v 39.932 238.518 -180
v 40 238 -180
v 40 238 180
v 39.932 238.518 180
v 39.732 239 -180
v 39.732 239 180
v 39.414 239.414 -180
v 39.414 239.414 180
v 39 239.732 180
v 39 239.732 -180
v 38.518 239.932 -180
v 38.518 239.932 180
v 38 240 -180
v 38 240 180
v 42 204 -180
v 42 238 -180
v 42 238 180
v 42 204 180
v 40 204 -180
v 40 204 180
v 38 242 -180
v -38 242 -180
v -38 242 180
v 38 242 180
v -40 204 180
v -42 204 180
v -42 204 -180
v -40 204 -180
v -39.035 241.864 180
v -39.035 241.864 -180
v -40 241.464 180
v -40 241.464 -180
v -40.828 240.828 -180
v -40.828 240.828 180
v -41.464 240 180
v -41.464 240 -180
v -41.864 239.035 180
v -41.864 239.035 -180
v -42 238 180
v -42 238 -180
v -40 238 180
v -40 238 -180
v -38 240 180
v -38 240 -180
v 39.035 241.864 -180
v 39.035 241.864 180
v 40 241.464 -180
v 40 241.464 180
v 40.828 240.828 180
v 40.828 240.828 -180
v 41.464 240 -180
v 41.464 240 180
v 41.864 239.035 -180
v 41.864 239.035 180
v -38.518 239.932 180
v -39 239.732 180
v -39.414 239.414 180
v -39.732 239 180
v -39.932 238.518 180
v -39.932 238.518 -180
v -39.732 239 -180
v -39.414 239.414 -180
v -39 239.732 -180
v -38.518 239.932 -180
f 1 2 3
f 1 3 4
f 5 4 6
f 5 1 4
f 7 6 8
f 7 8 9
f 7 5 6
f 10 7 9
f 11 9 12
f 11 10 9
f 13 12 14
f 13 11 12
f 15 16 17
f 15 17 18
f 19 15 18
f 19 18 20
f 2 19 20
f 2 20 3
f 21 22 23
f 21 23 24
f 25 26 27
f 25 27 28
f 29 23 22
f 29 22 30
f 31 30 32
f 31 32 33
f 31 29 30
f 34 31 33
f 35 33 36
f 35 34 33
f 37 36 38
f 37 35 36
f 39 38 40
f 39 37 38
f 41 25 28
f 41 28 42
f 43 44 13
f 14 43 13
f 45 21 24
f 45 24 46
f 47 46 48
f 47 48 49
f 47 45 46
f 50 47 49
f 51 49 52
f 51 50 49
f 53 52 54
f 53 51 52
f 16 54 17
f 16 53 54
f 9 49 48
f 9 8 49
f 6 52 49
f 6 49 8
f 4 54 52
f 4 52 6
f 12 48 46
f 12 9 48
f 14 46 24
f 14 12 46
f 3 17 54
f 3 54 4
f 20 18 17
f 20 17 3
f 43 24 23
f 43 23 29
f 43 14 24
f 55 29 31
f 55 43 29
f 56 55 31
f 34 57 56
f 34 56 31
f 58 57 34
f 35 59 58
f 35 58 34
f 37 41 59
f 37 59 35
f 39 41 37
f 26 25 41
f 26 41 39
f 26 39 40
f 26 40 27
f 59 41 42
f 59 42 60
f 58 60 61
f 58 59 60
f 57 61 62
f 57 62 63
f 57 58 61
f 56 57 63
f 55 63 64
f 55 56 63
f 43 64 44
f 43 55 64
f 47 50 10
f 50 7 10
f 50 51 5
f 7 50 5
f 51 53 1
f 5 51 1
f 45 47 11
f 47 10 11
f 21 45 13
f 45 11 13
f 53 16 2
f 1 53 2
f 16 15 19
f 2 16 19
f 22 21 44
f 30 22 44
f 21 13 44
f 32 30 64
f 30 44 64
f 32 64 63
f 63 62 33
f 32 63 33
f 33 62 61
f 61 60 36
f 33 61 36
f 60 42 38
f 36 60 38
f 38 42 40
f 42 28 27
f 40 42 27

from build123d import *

# Parameters (mm, degrees)
SKETCH1_W                      = 80
SKETCH1_H                      = 360
BASE_FLANGE1_DEPTH             = 2
EDGE_FLANGE1_STRIP_W           = 12
EDGE_FLANGE1_STRIP_H           = 2
EDGE_FLANGE1_STRIP_CUT_DEPTH   = 360
EDGE_FLANGE1_STRIP_2_W         = 12
EDGE_FLANGE1_STRIP_2_H         = 2
EDGE_FLANGE1_STRIP_CUT_2_DEPTH = 360
EDGE_FLANGE1_DEPTH             = 360
EDGE_FLANGE1_BEND_DEPTH        = 360


# Sheet-metal steps are written as plain solids
with BuildPart() as part:
    # Sketch1 → Base-Flange1 (new body)
    with BuildSketch(Plane(origin=(0, 240, 0), x_dir=(1, 0, 0), z_dir=(0, 1, 0))):
        Rectangle(SKETCH1_W, SKETCH1_H)
    extrude(amount=BASE_FLANGE1_DEPTH)

    # Edge-Flange1 strip (across the edge) → Edge-Flange1 strip cut (cut)
    with BuildSketch(Plane(origin=(40, 240, -180), x_dir=(-1, 0, 0), z_dir=(0, 0, 1))):
        with Locations((-4, -1)):
            Rectangle(EDGE_FLANGE1_STRIP_W, EDGE_FLANGE1_STRIP_H)
    extrude(amount=EDGE_FLANGE1_STRIP_CUT_DEPTH, mode=Mode.SUBTRACT)

    # Edge-Flange1 strip 2 (across the edge) → Edge-Flange1 strip cut 2 (cut)
    with BuildSketch(Plane(origin=(-40, 240, 180), x_dir=(1, 0, 0), z_dir=(0, 0, -1))):
        with Locations((-4, -1)):
            Rectangle(EDGE_FLANGE1_STRIP_2_W, EDGE_FLANGE1_STRIP_2_H)
    extrude(amount=EDGE_FLANGE1_STRIP_CUT_2_DEPTH, mode=Mode.SUBTRACT)

    # Edge-Flange1 section (across the edge) → Edge-Flange1 (add)
    with BuildSketch(Plane(origin=(40, 240, -180), x_dir=(-1, 0, 0), z_dir=(0, 0, 1))):
        with BuildLine():
            Line((-2, 2), (-2, 36))
            Line((-2, 36), (0, 36))
            Line((0, 36), (0, 2))
            ThreePointArc((0, 2), (0.585786438, 0.585786438), (2, 0))
            Line((2, 0), (2, -2))
            ThreePointArc((2, -2), (-0.828427125, -0.828427125), (-2, 2))
        make_face()
    extrude(amount=EDGE_FLANGE1_DEPTH)

    # Edge-Flange1 section 2 (across the edge) → Edge-Flange1 bend (add)
    with BuildSketch(Plane(origin=(-40, 240, 180), x_dir=(1, 0, 0), z_dir=(0, 0, -1))):
        with BuildLine():
            Line((-2, 2), (-2, 36))
            Line((-2, 36), (0, 36))
            Line((0, 36), (0, 2))
            ThreePointArc((0, 2), (0.585786438, 0.585786438), (2, 0))
            Line((2, 0), (2, -2))
            ThreePointArc((2, -2), (-0.828427125, -0.828427125), (-2, 2))
        make_face()
    extrude(amount=EDGE_FLANGE1_BEND_DEPTH)


solid = part.part
